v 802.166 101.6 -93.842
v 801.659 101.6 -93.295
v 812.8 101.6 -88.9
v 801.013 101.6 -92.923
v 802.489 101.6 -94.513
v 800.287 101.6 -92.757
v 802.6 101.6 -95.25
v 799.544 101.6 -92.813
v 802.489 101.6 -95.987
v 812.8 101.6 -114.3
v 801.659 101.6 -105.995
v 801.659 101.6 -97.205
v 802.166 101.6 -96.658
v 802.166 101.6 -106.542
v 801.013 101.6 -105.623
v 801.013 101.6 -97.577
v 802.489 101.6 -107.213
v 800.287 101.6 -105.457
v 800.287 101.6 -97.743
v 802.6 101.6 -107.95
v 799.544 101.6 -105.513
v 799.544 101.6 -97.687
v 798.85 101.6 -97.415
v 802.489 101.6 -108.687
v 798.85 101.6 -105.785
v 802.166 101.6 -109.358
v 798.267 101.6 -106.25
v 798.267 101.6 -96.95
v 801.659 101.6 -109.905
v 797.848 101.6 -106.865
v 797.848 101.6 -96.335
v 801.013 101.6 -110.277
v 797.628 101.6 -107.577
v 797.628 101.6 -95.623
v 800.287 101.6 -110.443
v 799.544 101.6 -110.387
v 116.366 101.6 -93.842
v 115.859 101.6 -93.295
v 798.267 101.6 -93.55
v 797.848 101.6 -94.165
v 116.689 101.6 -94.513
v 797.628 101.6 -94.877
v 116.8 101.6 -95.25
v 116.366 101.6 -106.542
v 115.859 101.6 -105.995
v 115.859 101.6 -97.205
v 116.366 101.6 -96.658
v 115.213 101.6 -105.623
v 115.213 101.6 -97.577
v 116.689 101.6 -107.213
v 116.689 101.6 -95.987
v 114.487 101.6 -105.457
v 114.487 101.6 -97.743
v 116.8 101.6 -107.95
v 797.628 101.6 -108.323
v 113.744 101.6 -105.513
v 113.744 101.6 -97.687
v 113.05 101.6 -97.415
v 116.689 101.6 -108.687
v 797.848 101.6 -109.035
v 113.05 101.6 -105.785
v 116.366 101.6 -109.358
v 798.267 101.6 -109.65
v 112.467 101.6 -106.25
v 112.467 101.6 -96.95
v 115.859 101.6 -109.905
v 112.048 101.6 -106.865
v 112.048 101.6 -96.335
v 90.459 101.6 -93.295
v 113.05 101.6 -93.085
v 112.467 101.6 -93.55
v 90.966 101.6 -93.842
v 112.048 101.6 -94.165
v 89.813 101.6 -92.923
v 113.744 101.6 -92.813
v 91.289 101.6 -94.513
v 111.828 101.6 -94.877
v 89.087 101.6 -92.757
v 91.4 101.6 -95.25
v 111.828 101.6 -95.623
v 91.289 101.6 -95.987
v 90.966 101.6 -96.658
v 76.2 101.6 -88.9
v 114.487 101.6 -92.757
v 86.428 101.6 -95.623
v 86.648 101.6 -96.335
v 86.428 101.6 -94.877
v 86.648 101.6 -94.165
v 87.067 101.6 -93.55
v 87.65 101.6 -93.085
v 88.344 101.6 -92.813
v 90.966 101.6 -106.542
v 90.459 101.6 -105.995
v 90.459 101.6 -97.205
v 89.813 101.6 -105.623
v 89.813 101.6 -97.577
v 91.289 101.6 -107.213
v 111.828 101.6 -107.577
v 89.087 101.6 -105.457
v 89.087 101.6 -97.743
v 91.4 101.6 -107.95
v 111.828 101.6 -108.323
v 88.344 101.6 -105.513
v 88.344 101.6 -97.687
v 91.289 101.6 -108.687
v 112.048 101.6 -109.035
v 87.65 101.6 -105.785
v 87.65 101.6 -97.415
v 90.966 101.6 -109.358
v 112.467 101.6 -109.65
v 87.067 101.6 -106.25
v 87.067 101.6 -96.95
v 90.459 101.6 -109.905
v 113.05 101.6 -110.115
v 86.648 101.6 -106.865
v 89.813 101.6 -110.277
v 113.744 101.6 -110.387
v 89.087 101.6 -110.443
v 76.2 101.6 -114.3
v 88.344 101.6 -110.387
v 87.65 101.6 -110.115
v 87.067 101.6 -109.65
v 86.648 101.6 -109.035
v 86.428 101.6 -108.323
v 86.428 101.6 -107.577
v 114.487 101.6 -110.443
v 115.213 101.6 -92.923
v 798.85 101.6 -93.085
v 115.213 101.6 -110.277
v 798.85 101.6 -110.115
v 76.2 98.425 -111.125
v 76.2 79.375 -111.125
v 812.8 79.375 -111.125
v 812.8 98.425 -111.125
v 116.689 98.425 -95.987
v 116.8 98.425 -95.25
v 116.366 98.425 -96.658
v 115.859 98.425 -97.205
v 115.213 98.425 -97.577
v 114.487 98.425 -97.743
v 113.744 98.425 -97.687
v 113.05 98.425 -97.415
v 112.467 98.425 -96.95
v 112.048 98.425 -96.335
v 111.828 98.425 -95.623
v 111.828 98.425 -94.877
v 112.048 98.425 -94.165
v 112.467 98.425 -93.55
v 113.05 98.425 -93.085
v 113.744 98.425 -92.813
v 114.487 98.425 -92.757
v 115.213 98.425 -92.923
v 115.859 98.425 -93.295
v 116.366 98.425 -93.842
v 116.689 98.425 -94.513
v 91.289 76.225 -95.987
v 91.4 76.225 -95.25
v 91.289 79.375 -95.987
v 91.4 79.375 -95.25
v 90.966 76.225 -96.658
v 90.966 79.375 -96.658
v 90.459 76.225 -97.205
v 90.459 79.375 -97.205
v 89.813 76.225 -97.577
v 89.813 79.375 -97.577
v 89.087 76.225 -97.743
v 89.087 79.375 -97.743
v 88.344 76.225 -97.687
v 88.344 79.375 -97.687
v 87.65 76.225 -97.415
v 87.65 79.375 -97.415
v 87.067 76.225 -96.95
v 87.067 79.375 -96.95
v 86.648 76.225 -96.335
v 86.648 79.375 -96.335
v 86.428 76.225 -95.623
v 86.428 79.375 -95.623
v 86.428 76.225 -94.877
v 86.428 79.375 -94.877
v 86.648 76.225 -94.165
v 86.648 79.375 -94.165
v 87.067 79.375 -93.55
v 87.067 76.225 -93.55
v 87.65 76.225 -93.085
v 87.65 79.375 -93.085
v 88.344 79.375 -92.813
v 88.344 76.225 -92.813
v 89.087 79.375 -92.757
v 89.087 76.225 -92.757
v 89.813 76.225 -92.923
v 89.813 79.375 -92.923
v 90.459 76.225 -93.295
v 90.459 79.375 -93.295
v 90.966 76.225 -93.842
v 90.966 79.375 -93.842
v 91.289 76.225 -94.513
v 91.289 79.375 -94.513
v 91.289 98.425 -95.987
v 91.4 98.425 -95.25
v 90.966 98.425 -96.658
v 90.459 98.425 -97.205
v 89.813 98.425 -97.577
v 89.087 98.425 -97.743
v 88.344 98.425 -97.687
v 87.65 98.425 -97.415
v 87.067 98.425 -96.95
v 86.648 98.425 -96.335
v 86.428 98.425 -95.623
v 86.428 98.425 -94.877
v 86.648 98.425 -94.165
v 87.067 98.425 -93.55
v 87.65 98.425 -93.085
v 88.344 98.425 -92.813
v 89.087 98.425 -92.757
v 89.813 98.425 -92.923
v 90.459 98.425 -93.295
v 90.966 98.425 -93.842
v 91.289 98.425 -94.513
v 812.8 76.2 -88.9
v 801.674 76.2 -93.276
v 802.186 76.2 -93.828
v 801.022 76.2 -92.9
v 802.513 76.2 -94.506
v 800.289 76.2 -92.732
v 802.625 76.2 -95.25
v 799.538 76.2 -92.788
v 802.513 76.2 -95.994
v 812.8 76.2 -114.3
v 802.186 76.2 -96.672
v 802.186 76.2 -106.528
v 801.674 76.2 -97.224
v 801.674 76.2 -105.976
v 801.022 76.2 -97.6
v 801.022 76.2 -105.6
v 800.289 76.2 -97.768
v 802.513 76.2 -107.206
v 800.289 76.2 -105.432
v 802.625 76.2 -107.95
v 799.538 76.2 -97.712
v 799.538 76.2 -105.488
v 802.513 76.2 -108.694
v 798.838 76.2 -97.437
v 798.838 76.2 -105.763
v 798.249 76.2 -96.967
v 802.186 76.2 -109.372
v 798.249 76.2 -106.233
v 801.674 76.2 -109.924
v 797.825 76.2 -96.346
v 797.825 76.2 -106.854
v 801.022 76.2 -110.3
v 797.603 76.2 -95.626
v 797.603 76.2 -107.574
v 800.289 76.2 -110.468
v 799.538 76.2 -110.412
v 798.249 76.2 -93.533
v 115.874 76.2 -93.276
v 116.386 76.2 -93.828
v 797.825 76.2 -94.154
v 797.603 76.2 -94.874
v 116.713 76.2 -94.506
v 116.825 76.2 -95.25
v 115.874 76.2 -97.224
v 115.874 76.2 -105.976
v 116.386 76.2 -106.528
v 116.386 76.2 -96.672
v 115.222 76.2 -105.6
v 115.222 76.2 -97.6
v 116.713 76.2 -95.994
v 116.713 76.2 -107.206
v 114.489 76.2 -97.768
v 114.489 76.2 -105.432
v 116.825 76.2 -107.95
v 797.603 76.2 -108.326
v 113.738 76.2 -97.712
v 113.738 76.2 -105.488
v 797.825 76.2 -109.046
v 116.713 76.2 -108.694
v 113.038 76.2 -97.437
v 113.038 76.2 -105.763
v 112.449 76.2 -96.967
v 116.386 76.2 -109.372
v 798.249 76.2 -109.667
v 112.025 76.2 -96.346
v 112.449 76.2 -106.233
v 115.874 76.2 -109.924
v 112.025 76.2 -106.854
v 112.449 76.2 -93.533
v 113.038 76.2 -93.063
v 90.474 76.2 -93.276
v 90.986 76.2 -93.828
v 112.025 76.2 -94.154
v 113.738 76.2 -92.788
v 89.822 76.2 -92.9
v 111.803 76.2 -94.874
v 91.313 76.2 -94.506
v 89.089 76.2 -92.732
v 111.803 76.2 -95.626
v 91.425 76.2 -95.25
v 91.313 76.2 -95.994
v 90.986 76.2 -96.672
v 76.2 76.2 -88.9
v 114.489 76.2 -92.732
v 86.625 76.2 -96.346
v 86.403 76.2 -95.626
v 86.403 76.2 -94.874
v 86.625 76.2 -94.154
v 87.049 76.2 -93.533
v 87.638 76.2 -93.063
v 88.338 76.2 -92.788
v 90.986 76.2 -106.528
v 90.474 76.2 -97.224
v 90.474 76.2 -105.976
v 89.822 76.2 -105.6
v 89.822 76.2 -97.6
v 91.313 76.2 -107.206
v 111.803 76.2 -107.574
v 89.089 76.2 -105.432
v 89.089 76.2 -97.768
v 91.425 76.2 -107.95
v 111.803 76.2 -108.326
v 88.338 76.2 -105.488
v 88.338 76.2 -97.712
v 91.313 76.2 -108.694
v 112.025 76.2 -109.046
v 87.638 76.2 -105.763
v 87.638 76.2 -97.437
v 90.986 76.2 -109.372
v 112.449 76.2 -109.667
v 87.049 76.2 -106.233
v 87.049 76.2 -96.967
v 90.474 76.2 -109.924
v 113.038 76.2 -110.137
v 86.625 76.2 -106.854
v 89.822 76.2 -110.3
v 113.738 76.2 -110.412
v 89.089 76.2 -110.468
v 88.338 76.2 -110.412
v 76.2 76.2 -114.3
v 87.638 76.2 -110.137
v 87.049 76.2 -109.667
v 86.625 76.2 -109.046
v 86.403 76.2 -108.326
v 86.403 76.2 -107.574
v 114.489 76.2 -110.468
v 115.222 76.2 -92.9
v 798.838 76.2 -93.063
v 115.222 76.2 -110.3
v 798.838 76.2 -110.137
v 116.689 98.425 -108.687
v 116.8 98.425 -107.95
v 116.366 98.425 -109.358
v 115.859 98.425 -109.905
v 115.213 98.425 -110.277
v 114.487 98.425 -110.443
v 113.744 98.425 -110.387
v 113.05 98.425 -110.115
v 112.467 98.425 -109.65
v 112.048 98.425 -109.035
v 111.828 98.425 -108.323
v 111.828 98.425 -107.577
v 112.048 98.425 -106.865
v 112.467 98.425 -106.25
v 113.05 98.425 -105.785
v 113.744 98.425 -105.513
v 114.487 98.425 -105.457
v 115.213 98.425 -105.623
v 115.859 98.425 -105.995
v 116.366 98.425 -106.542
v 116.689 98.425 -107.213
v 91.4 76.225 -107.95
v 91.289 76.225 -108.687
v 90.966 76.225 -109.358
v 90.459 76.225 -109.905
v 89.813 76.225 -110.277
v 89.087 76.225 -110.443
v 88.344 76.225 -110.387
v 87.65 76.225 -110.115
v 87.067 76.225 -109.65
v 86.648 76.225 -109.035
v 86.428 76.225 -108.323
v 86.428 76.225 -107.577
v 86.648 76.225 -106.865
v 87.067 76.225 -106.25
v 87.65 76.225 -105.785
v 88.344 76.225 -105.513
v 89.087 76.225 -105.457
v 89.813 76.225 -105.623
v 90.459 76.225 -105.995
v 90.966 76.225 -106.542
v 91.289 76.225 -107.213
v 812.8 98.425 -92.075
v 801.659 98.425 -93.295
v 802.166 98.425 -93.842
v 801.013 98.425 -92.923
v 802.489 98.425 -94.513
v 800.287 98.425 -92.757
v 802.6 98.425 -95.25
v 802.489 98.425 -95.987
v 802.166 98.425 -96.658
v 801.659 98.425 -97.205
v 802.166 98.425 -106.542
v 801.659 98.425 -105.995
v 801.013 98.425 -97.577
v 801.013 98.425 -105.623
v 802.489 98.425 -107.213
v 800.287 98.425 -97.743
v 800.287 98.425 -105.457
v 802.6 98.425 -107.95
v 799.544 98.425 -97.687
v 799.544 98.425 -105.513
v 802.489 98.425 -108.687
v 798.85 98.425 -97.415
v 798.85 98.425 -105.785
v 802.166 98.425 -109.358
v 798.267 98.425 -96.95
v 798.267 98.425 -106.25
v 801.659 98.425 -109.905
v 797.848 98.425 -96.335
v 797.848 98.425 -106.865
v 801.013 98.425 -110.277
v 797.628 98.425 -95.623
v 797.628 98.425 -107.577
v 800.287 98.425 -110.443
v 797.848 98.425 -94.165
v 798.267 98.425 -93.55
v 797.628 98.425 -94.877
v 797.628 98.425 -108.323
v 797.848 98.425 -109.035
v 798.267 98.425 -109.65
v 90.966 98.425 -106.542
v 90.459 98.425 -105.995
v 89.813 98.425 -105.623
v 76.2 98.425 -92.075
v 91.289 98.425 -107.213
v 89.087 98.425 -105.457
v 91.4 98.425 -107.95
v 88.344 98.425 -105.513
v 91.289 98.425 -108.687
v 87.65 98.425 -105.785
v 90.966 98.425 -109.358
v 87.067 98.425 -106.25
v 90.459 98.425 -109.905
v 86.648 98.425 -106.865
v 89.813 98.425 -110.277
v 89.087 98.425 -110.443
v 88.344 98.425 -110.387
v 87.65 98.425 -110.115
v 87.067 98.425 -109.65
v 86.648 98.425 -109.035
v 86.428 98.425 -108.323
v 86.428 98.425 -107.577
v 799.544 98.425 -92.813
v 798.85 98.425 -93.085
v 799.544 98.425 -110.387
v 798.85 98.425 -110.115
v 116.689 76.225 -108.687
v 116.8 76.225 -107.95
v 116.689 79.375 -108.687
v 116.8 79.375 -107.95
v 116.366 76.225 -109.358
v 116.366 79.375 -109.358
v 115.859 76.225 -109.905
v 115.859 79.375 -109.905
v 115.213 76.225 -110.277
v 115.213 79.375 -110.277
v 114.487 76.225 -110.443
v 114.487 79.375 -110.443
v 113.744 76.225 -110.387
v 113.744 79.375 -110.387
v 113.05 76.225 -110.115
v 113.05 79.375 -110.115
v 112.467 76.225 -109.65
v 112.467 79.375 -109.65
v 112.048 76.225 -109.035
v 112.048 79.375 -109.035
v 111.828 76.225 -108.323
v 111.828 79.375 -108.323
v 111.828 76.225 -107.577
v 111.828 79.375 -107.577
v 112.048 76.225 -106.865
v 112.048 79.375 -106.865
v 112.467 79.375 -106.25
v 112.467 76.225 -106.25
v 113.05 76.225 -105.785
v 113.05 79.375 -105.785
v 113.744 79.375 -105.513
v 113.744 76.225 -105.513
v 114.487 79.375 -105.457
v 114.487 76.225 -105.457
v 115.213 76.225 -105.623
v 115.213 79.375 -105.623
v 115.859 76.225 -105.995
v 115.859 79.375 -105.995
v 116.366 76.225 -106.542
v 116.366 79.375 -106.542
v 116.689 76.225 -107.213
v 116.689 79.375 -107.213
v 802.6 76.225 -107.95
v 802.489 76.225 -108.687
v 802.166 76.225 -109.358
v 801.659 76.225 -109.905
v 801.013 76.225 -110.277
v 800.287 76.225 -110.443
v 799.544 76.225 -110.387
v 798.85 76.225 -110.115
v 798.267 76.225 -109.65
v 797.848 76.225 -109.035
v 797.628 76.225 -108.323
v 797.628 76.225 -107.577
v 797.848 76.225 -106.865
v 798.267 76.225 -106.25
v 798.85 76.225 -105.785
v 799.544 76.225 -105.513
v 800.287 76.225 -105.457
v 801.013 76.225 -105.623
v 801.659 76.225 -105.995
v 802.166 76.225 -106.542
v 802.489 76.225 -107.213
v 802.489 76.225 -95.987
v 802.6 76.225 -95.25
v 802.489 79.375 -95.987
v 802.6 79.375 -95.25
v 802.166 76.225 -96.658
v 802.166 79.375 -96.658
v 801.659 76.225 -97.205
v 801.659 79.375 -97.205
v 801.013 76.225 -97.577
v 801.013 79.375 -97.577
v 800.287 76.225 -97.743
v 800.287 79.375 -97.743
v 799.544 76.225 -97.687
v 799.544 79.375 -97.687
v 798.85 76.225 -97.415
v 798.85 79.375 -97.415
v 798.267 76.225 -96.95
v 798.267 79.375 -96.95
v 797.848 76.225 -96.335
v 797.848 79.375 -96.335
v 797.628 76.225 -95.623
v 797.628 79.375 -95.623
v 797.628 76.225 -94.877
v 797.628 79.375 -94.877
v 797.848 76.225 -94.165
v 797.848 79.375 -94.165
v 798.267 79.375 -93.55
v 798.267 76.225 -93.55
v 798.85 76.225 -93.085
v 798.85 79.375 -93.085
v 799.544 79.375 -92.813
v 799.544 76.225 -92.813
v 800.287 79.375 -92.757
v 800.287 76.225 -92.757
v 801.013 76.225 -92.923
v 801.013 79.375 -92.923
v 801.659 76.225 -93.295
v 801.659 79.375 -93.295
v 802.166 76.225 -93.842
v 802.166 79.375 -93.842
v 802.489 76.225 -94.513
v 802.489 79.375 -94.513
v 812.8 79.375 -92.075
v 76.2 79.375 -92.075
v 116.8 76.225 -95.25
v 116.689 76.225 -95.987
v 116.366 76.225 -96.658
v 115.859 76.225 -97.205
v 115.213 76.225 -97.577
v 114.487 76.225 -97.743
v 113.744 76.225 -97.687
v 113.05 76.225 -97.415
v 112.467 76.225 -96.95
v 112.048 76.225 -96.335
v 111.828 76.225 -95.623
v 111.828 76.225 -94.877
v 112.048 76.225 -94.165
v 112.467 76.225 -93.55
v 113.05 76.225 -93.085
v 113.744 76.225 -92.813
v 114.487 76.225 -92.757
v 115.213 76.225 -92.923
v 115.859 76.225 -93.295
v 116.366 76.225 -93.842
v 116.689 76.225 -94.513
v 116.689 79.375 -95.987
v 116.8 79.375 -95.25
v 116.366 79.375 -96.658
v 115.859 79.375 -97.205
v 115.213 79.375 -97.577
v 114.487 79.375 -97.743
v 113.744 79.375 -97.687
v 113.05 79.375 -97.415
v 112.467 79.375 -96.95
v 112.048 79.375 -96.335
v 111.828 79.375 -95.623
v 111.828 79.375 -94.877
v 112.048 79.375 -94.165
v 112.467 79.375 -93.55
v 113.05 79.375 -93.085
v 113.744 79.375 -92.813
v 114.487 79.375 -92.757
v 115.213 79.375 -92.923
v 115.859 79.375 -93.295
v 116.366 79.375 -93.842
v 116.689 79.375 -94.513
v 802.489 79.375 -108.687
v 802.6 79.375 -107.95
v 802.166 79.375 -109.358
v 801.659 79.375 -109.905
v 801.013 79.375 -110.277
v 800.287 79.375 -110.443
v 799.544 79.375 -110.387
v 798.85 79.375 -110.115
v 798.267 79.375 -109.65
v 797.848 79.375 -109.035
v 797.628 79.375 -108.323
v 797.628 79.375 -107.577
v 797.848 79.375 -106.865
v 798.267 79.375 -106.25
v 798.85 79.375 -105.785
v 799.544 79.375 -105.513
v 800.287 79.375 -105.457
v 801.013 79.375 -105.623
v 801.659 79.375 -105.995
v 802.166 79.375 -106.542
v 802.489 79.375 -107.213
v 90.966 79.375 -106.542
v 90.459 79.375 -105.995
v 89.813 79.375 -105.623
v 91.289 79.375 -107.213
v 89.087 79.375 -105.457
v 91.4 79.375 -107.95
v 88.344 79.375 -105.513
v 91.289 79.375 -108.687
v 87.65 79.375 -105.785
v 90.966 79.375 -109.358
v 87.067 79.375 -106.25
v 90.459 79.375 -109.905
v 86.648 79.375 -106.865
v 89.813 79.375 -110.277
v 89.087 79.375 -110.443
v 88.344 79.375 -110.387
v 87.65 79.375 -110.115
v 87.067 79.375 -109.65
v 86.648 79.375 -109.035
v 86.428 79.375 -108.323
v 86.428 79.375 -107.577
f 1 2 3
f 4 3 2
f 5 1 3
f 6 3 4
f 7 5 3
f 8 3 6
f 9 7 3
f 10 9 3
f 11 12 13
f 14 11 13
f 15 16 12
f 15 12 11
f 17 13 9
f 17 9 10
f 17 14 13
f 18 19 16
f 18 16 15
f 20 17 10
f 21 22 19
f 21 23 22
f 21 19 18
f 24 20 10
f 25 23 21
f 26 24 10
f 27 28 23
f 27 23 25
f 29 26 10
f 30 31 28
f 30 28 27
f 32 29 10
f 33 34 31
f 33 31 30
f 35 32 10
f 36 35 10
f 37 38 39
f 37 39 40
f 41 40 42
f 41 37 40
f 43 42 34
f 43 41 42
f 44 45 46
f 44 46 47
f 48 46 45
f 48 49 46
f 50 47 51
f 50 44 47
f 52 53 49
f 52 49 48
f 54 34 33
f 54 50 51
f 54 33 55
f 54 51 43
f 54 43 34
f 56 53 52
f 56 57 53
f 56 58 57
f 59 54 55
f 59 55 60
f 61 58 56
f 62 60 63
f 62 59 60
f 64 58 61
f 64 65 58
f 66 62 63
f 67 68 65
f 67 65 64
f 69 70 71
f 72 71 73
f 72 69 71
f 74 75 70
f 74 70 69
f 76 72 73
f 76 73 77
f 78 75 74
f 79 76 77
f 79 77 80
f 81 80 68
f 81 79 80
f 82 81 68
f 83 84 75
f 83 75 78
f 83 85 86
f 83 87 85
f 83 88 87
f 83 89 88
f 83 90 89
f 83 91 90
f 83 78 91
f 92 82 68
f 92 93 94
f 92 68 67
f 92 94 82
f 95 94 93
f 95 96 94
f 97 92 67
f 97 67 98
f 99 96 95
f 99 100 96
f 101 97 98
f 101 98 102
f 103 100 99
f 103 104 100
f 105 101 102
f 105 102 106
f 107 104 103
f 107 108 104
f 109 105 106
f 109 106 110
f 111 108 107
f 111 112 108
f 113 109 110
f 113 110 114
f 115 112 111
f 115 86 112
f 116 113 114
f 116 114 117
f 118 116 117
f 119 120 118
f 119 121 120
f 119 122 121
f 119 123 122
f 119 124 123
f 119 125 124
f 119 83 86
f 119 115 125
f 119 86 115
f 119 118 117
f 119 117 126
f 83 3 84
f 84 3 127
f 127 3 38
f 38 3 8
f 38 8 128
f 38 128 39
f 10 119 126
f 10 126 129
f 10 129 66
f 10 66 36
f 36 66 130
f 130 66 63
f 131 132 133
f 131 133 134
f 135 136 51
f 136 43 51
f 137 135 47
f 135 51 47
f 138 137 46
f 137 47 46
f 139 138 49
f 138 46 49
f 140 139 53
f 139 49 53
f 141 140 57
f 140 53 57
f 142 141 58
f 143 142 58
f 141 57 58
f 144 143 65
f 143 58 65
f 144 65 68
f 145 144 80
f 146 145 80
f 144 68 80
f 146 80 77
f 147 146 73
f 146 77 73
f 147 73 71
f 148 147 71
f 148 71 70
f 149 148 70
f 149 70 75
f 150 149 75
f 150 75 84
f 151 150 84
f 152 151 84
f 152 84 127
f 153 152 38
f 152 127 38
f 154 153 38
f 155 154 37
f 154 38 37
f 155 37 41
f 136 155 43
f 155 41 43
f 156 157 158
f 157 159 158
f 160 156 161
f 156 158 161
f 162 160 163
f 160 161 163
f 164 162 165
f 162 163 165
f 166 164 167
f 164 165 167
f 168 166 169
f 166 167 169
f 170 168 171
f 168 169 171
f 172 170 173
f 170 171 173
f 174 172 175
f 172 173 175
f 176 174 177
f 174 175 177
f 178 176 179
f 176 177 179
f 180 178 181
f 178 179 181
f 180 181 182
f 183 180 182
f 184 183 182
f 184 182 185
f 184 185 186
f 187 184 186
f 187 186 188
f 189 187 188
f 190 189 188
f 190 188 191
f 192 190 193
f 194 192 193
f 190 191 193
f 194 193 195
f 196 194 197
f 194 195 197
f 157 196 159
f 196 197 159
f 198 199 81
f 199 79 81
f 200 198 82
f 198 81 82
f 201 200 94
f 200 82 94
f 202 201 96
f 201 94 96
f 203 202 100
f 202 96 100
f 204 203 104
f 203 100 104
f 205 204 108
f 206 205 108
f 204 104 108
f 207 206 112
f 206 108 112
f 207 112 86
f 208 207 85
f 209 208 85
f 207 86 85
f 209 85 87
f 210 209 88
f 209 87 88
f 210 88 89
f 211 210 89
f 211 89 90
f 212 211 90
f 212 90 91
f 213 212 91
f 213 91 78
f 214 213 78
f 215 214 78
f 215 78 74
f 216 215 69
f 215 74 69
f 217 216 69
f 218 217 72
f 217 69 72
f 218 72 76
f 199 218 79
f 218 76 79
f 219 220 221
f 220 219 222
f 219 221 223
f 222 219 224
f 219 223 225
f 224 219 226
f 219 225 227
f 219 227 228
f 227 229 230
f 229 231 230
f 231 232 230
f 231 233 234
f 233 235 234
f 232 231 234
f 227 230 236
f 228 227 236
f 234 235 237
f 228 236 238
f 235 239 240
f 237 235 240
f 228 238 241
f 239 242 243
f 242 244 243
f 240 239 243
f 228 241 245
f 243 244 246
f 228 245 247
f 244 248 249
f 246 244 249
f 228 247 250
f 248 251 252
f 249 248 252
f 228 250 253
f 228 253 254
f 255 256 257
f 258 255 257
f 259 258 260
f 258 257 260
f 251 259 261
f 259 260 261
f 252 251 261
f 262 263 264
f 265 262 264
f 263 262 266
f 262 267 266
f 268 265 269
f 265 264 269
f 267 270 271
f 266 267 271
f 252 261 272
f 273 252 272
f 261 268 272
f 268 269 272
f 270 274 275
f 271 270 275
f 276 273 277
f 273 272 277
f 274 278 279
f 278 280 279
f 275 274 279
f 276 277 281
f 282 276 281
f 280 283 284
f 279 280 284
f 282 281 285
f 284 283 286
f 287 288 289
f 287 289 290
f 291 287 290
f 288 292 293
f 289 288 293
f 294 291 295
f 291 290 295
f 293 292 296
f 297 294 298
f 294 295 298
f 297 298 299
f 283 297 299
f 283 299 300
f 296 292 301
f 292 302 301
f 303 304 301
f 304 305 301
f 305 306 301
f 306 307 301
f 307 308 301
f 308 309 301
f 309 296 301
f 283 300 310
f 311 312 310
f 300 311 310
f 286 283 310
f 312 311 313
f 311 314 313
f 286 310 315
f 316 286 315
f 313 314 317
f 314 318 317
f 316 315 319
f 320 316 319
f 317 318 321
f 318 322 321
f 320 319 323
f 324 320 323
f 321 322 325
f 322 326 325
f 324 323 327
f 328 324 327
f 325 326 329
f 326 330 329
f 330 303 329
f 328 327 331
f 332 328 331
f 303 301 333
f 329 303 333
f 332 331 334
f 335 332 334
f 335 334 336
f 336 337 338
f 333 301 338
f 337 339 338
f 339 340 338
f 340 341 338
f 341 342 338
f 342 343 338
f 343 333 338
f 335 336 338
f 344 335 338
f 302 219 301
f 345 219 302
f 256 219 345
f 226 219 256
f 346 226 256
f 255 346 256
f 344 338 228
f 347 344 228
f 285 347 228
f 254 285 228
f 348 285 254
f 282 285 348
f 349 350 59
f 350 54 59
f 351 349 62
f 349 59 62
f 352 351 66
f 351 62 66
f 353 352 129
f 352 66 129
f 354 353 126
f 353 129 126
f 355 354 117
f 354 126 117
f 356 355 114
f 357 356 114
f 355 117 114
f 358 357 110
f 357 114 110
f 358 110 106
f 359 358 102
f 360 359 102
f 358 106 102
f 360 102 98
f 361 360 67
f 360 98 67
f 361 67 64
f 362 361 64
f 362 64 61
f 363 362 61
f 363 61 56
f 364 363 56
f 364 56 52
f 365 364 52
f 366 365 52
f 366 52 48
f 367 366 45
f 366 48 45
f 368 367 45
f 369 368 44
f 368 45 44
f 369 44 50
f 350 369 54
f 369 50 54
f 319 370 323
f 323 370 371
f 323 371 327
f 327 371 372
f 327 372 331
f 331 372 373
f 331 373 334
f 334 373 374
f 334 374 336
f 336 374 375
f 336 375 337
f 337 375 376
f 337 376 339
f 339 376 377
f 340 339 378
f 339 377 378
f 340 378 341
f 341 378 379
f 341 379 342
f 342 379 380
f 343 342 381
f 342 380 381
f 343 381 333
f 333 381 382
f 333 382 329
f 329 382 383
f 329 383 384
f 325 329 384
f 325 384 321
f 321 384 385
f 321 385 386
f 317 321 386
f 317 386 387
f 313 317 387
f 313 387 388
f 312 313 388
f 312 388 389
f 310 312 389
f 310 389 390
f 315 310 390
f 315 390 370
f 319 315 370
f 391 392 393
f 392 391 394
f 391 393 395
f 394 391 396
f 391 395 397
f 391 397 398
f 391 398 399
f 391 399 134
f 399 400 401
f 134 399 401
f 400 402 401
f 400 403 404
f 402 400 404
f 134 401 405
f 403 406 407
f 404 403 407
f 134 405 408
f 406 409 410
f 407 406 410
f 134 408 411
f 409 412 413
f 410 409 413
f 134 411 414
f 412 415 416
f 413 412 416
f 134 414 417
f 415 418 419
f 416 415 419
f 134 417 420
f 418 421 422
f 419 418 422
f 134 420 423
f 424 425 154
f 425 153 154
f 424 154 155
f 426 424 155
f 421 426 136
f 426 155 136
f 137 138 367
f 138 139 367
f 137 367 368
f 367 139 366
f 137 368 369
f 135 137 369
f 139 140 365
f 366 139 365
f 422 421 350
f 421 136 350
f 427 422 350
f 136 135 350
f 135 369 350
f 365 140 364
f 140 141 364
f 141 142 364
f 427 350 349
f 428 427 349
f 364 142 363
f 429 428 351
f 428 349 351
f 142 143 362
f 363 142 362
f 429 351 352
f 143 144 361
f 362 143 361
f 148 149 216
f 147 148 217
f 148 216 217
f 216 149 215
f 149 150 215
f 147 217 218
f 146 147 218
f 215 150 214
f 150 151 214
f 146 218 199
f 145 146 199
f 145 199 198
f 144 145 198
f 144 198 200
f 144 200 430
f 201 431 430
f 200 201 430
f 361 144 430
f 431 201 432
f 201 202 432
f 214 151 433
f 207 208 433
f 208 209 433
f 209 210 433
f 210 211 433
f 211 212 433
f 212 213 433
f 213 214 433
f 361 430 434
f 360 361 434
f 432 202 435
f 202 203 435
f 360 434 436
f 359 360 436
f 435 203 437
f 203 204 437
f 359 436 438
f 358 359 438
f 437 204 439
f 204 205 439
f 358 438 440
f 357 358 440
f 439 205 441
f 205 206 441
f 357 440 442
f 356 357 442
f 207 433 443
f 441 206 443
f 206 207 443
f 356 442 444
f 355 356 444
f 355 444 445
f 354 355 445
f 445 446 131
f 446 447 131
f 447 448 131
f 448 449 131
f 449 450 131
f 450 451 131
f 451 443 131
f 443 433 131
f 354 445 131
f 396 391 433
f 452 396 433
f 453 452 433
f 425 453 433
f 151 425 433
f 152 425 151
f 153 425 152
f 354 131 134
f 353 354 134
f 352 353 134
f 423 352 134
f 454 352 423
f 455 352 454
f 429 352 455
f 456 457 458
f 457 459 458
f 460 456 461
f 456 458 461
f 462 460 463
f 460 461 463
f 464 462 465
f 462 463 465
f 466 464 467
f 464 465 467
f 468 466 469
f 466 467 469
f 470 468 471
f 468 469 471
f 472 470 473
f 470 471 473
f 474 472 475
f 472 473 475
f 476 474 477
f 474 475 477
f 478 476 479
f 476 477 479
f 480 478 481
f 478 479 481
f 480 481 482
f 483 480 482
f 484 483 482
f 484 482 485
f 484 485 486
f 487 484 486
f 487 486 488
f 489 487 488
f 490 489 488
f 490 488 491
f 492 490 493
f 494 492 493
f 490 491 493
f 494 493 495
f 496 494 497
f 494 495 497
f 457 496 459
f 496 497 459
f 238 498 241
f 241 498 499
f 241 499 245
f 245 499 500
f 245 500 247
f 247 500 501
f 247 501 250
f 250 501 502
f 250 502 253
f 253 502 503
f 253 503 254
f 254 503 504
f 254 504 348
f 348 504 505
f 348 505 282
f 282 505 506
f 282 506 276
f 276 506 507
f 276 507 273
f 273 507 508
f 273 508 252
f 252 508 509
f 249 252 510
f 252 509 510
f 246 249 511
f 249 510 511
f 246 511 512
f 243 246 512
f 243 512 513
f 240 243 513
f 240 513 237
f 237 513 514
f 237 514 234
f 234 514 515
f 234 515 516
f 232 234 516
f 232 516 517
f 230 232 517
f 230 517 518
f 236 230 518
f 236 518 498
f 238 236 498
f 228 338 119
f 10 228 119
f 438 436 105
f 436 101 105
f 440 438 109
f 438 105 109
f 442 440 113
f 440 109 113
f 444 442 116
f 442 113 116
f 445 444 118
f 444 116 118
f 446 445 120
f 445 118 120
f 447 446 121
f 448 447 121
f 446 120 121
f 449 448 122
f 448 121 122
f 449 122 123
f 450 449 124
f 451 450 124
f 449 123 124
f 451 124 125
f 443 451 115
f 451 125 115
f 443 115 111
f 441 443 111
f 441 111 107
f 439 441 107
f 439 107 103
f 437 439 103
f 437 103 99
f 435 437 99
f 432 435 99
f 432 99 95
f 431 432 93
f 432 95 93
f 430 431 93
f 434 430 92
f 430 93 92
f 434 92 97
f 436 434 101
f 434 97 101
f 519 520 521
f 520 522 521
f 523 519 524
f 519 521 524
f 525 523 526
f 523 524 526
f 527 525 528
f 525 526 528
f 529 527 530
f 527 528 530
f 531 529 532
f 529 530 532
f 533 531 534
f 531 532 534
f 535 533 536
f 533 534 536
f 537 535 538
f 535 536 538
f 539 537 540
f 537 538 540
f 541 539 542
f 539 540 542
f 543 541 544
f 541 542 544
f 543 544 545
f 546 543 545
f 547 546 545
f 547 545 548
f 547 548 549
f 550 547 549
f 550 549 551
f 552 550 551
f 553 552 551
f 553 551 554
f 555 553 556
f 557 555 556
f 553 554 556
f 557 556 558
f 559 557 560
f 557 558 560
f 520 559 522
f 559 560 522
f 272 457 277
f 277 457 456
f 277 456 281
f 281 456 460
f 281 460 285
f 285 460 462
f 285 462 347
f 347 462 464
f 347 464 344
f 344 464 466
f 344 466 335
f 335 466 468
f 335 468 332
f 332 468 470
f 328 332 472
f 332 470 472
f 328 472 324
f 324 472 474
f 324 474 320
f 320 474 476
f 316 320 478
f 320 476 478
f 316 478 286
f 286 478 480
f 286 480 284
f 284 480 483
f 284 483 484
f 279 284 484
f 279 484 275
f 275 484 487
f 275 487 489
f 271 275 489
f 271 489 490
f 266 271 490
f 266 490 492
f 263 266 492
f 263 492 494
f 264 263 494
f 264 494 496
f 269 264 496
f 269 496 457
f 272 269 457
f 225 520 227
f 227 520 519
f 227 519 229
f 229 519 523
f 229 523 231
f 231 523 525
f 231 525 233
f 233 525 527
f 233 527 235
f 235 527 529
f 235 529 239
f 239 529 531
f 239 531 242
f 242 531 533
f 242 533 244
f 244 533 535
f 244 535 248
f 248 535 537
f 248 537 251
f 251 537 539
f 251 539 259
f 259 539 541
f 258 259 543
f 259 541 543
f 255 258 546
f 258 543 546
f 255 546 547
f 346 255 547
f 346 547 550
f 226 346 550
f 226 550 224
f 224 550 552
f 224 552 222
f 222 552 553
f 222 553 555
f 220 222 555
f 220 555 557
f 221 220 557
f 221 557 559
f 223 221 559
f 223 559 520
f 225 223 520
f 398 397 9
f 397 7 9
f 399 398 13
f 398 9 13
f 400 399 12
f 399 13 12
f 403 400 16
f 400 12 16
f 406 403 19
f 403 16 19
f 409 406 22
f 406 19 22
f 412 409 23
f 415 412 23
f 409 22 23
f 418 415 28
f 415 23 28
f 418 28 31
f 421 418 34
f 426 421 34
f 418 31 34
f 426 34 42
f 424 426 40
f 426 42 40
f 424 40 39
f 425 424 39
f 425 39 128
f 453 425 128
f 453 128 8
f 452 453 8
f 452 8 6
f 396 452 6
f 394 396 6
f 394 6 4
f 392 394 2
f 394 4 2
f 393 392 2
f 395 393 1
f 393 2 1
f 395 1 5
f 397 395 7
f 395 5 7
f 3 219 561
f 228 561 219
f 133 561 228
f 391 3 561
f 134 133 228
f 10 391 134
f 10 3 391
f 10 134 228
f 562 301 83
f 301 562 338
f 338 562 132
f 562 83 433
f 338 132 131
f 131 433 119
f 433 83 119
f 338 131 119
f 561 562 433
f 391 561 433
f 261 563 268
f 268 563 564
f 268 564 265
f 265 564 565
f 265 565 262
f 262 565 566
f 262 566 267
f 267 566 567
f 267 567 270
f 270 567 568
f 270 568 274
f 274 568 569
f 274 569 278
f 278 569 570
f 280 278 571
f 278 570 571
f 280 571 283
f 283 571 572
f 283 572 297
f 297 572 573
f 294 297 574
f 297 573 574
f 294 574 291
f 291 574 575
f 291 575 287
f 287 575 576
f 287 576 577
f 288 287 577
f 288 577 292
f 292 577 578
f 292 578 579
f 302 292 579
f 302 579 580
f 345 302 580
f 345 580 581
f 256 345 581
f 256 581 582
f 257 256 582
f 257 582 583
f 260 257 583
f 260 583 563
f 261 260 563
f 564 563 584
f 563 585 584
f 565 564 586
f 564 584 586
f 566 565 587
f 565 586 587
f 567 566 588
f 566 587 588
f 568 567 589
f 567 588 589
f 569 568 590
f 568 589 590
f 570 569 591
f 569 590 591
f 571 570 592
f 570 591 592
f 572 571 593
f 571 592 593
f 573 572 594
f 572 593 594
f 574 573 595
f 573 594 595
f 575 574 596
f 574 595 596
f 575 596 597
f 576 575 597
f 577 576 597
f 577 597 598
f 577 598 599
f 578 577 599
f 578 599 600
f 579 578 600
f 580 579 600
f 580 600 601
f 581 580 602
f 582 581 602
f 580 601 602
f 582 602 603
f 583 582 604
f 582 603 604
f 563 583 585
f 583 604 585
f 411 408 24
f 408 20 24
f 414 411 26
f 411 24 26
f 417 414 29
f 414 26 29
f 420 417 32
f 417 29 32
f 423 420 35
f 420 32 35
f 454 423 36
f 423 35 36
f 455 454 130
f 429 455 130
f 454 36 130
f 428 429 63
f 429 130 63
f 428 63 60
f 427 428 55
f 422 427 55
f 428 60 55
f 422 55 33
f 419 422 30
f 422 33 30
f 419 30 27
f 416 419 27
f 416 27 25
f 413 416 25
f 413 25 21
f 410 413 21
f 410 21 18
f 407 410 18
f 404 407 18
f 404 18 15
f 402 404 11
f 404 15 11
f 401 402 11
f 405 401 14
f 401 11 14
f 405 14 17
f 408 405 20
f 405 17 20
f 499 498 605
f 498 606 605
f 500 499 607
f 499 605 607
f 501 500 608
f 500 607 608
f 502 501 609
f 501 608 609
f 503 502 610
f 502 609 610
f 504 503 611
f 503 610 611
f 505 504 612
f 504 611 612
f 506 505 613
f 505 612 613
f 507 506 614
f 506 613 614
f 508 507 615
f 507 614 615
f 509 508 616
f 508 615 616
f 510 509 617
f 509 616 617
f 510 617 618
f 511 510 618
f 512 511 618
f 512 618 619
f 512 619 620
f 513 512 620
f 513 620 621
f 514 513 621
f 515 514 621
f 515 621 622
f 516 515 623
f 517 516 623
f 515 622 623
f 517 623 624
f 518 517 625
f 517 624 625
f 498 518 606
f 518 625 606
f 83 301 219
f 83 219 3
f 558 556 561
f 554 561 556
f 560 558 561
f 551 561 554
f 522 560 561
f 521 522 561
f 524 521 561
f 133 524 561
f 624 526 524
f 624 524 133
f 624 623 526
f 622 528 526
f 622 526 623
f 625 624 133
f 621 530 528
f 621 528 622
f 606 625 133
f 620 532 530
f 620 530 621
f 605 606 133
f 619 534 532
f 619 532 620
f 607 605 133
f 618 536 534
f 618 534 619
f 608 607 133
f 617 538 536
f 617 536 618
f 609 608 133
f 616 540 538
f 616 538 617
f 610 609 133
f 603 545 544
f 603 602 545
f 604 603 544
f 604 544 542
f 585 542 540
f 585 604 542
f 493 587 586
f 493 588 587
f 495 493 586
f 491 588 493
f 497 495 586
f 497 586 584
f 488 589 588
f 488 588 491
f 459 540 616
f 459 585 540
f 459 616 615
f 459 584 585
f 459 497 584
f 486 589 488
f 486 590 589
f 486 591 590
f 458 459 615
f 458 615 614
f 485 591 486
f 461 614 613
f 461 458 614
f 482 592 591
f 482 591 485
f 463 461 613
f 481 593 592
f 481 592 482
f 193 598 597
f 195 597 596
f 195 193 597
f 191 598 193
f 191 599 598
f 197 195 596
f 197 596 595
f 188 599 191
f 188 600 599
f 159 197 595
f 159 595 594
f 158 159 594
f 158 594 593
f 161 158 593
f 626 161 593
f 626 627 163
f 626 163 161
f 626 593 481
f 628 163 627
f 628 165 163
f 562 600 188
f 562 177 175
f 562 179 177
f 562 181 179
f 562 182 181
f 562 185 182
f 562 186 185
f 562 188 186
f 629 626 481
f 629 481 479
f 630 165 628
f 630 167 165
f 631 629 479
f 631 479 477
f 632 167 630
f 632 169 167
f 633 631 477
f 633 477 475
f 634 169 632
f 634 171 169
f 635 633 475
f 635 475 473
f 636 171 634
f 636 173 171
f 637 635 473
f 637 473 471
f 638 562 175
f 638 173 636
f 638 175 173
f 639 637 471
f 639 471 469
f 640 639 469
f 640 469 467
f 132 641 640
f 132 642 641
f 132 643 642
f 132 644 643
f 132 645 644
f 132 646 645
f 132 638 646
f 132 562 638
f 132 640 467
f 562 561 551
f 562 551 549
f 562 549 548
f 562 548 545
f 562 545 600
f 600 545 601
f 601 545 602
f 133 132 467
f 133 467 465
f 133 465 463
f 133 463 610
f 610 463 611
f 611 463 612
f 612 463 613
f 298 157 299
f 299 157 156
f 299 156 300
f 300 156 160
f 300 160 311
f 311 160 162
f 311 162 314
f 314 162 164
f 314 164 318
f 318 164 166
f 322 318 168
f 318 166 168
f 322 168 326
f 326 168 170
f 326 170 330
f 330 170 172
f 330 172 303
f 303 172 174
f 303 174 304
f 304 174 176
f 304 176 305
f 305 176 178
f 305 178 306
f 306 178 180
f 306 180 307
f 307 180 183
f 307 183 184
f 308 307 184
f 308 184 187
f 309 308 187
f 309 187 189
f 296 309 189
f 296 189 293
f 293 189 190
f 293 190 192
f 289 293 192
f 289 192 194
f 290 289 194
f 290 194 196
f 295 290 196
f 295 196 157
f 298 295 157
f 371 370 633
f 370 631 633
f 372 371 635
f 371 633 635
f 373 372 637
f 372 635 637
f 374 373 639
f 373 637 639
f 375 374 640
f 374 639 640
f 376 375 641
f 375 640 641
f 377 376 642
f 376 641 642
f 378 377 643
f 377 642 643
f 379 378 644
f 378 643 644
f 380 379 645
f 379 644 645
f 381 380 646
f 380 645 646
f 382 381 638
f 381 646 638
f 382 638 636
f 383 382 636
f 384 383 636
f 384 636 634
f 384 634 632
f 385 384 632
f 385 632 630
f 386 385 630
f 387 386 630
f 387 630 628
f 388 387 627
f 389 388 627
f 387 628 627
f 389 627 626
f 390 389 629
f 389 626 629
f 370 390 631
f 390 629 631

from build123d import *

# Parameters (mm, degrees)
EXTRUDE_THIN1_START             = 76.2
SKETCH5_W                       = 25.4
SKETCH5_H                       = 25.4
SKETCH5_W_2                     = 19.05
SKETCH5_H_2                     = 19.05
EXTRUDE_THIN1_DEPTH             = 736.6
F_5_0MM_DOWEL_HOLE1_D           = 5
F_5_0MM_DOWEL_HOLE1_CSINK_D     = 5.05
F_5_0MM_DOWEL_HOLE1_CSINK_ANGLE = 90


with BuildPart() as part:
    # Sketch5 → Extrude-Thin1 (new body)
    with BuildSketch(Plane(origin=(0, 0, 0), x_dir=(0, 0, -1), z_dir=(1, 0, 0)).offset(EXTRUDE_THIN1_START)):
        with Locations((101.6, 88.9)):
            Rectangle(SKETCH5_W, SKETCH5_H)
        with Locations((101.6, 88.9)):
            Rectangle(SKETCH5_W_2, SKETCH5_H_2, mode=Mode.SUBTRACT)
    extrude(amount=EXTRUDE_THIN1_DEPTH)

    # Ø5.0mm Dowel Hole1 (through all)
    with Locations(Plane(origin=(0, 76.2, 0), x_dir=(-1, 0, 0), z_dir=(0, -1, 0))):
        with Locations((-88.9, 107.95), (-88.9, 95.25), (-114.3, 107.95), (-114.3, 95.25), (-800.1, 107.95), (-800.1, 95.25)):
            CounterSinkHole(F_5_0MM_DOWEL_HOLE1_D / 2, F_5_0MM_DOWEL_HOLE1_CSINK_D / 2, counter_sink_angle=F_5_0MM_DOWEL_HOLE1_CSINK_ANGLE)


solid = part.part
